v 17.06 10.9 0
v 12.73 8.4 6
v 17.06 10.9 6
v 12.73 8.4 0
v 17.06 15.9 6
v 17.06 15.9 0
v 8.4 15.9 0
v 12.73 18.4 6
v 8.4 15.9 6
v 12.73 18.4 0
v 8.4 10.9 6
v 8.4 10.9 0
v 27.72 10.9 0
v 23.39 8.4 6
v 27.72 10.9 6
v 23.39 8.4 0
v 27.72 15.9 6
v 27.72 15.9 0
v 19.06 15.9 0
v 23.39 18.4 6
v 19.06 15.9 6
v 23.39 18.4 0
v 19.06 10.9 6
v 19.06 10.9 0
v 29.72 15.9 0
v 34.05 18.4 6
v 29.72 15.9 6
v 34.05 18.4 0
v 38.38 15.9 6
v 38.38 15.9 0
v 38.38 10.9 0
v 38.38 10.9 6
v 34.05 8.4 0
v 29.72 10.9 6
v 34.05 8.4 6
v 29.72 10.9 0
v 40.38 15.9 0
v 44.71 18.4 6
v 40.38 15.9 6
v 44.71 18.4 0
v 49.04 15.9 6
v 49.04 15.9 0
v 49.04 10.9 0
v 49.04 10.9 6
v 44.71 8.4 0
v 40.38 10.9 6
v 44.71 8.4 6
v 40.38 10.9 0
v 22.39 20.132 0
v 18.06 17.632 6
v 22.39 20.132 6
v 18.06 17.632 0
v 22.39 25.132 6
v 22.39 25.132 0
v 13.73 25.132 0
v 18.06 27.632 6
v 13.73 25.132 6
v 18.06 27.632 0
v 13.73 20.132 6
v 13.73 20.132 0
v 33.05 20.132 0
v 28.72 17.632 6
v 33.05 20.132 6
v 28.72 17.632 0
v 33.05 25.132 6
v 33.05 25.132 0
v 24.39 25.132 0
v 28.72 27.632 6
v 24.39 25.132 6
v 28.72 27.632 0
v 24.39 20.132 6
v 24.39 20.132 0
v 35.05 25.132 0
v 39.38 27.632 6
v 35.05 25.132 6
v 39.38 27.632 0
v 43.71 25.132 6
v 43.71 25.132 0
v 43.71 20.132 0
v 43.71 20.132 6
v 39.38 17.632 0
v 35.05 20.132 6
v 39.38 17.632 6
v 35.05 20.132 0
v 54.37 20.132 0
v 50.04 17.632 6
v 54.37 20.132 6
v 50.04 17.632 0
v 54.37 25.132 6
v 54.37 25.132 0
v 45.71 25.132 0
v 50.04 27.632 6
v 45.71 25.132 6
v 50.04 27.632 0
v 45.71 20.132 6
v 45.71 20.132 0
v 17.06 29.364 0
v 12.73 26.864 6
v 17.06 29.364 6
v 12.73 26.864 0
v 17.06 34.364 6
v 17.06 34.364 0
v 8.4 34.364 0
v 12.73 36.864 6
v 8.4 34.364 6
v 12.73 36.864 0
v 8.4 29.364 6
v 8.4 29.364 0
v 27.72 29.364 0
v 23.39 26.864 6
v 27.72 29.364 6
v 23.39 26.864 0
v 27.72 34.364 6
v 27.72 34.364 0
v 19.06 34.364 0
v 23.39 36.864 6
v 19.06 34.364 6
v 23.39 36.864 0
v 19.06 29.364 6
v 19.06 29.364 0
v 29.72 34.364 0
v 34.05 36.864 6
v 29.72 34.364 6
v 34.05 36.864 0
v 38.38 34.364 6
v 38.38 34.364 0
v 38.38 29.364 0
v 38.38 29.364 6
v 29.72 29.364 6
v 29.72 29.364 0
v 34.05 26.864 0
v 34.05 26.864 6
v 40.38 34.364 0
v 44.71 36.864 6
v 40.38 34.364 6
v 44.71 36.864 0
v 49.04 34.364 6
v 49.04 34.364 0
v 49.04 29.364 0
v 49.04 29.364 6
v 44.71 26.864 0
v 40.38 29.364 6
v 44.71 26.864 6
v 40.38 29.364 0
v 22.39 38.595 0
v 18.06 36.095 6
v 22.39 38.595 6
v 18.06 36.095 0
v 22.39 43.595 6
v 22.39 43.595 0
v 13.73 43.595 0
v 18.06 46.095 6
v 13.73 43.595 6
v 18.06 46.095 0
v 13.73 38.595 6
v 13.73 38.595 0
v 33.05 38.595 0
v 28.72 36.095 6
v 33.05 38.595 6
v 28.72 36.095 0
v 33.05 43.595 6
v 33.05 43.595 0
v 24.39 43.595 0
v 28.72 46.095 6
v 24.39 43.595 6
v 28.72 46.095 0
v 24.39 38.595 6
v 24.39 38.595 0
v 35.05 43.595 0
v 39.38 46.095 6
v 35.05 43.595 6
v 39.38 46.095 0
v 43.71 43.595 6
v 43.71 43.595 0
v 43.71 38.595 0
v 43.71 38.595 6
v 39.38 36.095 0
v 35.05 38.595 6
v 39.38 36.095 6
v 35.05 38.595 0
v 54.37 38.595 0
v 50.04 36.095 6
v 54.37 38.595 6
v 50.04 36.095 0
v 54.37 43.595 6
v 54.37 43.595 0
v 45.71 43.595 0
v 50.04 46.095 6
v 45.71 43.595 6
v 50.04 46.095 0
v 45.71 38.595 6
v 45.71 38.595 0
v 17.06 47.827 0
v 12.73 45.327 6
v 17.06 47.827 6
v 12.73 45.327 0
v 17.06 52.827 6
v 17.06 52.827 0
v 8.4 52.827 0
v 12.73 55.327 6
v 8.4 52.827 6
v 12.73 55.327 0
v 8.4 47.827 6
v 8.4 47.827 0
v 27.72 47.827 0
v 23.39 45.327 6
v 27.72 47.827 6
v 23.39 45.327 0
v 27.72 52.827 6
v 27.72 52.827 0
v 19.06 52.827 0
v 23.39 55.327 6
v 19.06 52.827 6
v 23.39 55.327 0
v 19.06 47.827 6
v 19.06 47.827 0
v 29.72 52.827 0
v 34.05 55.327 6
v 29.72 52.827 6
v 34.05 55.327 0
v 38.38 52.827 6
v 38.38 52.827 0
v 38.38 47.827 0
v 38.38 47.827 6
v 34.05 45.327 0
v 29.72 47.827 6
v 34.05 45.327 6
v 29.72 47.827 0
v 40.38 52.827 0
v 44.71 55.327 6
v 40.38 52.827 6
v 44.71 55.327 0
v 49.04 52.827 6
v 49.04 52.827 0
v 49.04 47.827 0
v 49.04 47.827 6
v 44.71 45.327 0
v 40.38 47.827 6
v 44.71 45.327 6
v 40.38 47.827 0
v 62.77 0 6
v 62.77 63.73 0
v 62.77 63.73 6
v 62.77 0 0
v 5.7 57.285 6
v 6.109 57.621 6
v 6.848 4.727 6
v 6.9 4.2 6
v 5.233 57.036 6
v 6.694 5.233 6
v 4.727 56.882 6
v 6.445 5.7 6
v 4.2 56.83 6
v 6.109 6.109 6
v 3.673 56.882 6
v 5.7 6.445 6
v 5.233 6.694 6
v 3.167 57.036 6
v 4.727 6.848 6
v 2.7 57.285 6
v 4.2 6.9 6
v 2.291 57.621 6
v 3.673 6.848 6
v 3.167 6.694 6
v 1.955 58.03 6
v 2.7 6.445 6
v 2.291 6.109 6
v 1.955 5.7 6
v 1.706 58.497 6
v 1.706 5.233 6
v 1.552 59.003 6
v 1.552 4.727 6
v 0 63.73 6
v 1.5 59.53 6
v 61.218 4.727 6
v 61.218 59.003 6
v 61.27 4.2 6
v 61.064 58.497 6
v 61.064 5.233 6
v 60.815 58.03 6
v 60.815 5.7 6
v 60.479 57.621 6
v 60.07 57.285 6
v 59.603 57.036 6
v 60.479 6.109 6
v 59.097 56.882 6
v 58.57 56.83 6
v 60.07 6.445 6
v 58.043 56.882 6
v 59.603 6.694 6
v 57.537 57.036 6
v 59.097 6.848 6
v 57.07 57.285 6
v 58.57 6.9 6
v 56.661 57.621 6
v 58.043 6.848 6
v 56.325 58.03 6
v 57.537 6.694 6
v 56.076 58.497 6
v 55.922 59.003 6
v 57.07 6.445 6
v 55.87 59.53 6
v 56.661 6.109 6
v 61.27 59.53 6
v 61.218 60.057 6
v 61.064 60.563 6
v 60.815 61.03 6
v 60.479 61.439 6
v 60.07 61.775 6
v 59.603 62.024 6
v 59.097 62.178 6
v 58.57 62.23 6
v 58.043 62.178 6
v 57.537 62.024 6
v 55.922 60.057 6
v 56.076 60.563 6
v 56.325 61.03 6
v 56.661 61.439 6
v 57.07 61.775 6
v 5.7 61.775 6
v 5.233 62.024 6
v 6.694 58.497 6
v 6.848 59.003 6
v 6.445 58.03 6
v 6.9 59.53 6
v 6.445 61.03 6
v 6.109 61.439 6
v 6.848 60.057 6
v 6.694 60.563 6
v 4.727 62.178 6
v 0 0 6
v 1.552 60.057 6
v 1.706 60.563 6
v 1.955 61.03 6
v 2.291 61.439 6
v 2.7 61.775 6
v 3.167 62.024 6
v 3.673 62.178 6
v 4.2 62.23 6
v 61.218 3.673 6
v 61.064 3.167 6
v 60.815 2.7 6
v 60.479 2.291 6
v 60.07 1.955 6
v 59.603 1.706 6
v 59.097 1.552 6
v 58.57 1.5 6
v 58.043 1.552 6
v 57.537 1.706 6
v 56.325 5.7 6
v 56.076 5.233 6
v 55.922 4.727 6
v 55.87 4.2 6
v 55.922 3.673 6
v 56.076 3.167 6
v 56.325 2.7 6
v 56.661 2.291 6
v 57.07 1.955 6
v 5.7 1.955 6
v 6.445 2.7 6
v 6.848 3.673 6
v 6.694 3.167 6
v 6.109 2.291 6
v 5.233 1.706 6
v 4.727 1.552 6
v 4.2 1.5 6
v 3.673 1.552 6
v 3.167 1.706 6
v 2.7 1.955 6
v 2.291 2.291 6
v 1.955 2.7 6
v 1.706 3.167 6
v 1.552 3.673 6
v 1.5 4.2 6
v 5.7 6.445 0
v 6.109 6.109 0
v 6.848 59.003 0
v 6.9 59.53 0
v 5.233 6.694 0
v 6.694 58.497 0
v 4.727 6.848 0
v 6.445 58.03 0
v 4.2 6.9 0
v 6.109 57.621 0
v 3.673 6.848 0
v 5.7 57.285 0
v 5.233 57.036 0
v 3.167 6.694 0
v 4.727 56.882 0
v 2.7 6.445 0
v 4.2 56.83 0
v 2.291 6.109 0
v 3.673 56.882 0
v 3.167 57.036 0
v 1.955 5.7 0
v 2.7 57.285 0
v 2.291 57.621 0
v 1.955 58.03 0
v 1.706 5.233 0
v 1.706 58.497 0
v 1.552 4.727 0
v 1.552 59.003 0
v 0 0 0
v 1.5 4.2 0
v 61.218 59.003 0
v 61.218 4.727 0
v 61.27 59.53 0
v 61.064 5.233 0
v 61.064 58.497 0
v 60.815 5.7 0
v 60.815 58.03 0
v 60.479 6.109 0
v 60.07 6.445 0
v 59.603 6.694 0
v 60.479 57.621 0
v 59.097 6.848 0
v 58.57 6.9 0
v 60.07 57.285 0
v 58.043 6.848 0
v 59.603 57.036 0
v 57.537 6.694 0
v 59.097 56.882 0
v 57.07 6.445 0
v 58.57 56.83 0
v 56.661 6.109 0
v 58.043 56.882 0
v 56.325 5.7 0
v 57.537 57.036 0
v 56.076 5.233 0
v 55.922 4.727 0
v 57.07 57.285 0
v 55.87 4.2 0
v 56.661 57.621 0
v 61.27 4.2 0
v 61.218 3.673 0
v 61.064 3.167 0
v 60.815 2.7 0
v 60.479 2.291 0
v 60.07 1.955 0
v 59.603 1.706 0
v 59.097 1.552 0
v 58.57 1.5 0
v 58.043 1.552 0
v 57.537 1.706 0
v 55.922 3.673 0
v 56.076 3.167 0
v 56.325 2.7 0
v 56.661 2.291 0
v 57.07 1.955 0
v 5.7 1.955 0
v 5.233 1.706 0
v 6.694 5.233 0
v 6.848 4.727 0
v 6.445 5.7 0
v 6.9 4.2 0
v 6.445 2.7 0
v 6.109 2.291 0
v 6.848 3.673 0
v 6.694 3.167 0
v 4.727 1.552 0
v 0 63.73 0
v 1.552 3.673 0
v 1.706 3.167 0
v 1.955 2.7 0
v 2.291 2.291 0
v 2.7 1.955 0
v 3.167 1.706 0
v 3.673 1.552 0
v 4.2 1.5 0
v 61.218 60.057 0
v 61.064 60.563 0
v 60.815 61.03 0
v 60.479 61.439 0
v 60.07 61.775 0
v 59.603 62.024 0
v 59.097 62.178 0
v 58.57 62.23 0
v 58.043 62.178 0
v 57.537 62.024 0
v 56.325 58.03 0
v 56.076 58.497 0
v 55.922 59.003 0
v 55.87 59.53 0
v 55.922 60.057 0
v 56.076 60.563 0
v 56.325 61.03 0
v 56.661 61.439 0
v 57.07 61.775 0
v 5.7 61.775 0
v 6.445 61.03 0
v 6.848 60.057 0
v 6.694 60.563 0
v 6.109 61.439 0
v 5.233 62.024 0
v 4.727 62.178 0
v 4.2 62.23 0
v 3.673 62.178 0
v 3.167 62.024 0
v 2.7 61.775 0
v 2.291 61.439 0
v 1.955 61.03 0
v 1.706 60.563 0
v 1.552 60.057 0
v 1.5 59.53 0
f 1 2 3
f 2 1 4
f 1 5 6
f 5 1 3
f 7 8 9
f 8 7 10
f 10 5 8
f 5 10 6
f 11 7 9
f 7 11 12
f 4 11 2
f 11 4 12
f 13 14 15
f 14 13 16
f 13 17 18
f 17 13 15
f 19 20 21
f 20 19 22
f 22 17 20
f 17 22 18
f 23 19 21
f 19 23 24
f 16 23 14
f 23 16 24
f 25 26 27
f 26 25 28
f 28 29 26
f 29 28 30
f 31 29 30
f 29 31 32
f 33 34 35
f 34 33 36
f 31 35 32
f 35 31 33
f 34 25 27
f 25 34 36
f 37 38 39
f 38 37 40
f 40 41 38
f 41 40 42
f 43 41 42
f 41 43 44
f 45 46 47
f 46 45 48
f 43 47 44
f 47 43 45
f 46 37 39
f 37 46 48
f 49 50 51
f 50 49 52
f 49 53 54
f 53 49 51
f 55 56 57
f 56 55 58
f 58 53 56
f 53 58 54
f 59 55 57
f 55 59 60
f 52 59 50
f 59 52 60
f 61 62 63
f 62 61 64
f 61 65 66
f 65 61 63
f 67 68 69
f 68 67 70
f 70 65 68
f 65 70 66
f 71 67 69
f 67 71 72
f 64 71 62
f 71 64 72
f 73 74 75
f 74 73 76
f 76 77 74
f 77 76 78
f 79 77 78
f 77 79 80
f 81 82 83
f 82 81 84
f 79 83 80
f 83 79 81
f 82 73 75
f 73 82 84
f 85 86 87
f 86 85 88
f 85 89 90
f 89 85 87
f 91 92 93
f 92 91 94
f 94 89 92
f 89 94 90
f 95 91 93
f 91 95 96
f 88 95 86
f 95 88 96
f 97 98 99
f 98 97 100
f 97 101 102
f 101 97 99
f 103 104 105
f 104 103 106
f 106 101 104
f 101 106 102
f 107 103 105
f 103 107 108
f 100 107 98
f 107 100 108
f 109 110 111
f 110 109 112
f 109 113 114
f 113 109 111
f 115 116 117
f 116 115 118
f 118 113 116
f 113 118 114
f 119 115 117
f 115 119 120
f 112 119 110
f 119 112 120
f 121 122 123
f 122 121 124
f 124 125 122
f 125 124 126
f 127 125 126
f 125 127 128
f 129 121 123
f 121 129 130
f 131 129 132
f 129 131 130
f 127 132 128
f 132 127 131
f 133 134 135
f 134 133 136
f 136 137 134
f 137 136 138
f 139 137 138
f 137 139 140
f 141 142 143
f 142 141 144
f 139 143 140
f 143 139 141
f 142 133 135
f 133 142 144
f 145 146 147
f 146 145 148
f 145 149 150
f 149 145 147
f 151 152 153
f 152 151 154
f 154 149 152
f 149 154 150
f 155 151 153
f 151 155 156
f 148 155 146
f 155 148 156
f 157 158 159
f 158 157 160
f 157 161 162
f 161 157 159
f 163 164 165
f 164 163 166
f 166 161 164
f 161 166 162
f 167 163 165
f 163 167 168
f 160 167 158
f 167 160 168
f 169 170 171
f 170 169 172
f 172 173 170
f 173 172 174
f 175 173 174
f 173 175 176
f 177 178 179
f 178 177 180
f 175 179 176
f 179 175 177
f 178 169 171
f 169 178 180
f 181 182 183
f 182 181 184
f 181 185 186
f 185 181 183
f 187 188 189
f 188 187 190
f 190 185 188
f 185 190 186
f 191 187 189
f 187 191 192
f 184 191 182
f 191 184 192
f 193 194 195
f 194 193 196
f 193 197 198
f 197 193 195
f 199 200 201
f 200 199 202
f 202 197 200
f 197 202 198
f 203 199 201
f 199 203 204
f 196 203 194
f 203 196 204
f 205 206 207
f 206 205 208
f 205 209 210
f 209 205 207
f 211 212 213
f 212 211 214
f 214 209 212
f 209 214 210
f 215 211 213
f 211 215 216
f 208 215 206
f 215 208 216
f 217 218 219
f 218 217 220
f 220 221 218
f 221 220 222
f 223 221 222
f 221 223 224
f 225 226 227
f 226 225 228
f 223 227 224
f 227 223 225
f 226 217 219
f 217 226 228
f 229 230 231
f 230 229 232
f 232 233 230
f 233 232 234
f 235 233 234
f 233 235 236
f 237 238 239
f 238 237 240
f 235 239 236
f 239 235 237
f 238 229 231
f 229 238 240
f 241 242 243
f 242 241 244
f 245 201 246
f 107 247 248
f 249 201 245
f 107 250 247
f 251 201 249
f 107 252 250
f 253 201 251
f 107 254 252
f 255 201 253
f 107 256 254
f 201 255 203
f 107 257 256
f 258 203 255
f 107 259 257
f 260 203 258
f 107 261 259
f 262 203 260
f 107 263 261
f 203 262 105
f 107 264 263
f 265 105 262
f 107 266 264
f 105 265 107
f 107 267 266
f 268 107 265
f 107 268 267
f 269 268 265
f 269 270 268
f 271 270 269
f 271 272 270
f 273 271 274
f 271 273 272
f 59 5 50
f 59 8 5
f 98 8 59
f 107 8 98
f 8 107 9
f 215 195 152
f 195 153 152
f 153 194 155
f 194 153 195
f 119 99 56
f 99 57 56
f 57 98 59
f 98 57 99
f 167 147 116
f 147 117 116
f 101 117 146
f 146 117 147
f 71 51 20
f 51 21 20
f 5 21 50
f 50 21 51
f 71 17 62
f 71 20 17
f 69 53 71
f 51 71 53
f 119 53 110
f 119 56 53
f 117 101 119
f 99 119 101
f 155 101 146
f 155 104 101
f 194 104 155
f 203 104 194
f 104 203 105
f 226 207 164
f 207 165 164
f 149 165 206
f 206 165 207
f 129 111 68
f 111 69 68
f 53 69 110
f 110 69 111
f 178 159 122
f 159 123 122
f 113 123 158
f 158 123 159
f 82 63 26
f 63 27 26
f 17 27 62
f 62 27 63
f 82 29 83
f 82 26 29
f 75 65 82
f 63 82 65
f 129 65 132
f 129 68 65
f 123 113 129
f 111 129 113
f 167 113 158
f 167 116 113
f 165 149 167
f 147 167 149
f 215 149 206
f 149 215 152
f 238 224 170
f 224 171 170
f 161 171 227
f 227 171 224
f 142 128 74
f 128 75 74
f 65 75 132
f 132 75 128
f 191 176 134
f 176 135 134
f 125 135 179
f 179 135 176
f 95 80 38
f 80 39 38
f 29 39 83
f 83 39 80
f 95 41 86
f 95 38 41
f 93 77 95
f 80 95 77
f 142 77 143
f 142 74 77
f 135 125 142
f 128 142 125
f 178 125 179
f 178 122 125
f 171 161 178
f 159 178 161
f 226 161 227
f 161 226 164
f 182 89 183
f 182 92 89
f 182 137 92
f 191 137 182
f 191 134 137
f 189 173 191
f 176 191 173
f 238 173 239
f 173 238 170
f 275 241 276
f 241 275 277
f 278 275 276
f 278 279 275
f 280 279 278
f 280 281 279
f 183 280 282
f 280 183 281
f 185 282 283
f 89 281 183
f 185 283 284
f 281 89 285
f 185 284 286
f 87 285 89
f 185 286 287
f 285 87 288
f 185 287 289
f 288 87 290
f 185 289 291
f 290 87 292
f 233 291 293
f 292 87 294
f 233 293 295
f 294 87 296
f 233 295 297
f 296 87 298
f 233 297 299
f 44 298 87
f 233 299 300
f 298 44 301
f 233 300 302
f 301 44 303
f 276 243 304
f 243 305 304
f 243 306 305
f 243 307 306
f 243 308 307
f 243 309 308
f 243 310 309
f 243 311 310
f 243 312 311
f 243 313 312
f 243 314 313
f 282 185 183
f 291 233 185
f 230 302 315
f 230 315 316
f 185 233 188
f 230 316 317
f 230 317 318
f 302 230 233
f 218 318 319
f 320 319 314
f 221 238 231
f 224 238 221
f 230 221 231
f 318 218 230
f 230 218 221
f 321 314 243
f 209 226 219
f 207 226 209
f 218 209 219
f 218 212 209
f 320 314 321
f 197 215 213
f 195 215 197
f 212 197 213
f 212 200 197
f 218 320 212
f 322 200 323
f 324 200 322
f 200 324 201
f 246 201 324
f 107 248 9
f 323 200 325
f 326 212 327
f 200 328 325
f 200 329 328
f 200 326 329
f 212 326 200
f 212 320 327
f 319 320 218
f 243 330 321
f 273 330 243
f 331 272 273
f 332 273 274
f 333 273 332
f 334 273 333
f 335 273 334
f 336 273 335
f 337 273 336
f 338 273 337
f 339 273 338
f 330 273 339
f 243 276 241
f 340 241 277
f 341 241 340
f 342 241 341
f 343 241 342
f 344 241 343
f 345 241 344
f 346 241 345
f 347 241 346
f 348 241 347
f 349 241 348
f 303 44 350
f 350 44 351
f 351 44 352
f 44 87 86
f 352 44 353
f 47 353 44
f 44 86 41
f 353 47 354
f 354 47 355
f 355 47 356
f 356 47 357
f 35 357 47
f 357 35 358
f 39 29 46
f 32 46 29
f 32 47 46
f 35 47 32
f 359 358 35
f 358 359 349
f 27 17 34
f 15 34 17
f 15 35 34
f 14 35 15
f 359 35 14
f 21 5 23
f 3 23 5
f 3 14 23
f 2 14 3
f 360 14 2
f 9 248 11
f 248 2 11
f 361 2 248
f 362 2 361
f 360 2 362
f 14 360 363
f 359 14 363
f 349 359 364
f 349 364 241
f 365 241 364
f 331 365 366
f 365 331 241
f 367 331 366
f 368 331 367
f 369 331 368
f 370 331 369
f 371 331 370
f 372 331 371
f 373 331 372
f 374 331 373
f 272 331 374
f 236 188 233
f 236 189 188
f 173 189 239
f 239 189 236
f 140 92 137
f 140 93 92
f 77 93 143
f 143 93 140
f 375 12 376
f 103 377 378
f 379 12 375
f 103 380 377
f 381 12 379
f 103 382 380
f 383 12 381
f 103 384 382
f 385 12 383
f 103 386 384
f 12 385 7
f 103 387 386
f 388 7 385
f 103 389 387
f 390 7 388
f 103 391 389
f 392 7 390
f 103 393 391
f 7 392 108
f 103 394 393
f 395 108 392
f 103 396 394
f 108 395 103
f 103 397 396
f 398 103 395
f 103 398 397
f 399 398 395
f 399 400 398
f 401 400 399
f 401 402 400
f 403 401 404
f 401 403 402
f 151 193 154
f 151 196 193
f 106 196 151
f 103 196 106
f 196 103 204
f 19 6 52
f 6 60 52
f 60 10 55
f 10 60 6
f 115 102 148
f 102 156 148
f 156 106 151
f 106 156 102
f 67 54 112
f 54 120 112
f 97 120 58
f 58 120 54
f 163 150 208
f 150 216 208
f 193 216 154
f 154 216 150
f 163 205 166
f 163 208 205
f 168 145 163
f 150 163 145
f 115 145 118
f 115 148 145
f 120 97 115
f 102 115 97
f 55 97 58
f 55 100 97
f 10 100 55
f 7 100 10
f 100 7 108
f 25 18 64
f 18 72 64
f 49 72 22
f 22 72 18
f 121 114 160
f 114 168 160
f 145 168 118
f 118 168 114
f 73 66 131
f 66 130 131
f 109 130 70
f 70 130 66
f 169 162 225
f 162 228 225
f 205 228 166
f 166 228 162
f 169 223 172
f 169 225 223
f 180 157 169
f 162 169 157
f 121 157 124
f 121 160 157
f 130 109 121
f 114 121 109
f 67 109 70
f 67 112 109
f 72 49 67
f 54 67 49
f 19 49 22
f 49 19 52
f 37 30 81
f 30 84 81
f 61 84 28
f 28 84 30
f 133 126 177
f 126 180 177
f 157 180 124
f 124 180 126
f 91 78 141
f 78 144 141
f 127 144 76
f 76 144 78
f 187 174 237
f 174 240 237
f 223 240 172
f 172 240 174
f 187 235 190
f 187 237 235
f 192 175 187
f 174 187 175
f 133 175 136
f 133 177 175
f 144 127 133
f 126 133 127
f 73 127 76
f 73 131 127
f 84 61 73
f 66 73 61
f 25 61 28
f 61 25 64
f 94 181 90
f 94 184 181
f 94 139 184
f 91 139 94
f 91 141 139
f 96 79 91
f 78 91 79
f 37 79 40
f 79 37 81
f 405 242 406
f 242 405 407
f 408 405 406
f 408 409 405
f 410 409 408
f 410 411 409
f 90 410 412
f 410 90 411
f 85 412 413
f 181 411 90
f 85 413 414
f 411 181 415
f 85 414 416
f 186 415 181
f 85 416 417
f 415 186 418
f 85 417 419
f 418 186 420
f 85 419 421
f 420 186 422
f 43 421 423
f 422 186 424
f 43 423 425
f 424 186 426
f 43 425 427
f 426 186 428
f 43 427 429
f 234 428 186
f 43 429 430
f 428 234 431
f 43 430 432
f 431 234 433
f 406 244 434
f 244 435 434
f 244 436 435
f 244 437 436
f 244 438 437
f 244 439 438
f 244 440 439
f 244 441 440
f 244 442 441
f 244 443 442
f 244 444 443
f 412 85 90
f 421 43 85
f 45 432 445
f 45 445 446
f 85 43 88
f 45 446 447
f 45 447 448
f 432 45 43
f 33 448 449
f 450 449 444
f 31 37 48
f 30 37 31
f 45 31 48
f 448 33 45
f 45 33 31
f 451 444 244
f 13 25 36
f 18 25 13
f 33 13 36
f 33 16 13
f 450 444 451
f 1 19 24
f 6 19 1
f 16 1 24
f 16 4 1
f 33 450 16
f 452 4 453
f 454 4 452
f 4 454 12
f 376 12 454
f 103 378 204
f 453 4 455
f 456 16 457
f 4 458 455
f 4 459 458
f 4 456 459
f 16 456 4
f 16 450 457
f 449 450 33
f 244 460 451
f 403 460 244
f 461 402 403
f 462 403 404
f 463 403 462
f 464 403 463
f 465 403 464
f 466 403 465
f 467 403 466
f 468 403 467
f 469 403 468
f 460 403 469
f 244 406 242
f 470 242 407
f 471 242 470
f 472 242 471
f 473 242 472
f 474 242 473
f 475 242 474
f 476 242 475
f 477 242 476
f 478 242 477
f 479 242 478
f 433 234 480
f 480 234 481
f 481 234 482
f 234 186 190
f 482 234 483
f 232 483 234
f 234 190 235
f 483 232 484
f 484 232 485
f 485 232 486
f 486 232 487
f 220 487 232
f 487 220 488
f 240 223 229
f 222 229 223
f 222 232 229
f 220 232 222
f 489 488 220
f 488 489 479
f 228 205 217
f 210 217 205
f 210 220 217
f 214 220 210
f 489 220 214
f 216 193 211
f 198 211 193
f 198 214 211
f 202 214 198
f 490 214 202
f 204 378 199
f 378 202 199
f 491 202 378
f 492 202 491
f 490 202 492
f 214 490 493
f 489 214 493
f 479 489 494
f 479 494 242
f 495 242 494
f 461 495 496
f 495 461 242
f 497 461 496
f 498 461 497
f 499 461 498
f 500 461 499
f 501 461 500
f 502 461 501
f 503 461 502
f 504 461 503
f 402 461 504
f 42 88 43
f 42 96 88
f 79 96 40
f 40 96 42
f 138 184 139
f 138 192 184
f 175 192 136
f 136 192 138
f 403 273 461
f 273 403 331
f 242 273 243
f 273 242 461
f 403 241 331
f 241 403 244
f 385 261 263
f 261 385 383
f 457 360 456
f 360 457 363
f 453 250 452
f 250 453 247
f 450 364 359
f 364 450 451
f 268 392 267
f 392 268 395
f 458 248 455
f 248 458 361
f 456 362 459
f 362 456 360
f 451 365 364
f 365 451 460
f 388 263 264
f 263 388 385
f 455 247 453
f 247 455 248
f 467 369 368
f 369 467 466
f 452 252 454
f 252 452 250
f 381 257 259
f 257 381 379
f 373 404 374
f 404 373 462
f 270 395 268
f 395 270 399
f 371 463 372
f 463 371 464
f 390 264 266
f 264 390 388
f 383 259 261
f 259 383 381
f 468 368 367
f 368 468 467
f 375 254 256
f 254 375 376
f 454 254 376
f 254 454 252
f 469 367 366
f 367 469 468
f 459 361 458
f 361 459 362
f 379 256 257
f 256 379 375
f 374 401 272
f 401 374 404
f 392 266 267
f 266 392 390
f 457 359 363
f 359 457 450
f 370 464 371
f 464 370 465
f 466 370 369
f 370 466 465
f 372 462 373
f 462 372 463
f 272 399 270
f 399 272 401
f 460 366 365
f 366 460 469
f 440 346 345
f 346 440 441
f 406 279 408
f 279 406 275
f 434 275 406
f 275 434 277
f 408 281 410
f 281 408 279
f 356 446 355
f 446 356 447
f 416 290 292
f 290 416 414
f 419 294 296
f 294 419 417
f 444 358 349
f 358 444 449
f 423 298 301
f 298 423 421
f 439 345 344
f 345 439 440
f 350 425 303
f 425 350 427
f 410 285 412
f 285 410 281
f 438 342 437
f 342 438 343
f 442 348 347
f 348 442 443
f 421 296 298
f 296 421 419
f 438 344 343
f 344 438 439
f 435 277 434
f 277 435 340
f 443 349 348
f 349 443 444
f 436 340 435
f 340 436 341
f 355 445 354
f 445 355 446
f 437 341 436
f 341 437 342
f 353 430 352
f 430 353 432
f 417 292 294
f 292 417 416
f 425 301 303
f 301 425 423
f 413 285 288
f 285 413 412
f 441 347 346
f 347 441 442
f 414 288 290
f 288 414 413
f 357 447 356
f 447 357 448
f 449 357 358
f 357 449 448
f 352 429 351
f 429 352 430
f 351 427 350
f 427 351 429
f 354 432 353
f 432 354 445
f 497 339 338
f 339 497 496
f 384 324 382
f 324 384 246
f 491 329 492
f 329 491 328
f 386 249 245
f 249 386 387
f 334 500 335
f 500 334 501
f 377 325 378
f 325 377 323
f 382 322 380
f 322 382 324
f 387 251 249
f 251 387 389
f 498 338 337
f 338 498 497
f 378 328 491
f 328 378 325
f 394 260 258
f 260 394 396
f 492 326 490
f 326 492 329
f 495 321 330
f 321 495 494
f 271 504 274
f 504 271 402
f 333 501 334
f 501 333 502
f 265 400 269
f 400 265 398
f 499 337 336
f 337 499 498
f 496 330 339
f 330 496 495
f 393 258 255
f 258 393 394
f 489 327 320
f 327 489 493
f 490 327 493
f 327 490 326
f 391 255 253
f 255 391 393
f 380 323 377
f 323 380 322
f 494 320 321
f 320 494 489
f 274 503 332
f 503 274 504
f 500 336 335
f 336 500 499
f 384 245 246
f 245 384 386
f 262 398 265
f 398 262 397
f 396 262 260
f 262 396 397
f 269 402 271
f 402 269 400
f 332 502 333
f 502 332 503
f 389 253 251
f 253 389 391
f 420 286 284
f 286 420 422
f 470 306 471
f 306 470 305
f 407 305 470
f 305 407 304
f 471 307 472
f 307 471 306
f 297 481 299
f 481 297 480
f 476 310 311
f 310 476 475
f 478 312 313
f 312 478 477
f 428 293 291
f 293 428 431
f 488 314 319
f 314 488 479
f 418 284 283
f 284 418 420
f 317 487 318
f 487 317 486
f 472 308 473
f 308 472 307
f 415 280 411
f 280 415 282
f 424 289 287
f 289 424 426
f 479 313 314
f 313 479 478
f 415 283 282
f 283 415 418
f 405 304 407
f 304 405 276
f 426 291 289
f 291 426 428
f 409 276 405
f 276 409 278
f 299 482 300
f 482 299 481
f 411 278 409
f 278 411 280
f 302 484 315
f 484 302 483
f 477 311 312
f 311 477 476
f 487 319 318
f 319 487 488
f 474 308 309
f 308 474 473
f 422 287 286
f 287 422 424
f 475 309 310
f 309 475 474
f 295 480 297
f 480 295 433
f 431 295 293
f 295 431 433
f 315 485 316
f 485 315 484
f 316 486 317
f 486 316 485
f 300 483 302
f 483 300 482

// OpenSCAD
$fn = 32;

// ----------------------------------------------------------------------
// Honeycomb panel: 62.77 x 63.73 mm, 20 cells of 10 mm
// ----------------------------------------------------------------------

// --- parameters (mm) ---
panel_w = 62.77;          // panel width
panel_d = 63.73;          // panel depth
thick = 6;                // panel thickness
cell_r = 5;               // hex cell circumradius
pitch = 10.66;            // hex cell pitch (centre to centre)
web = 2;                  // web between the cells
columns = 4;              // columns of cells
rows = 5;                 // rows of cells
cell_count = 20;          // total cells
shift_x = 12.73;          // first cell offset in x
shift_y = 13.4;           // first cell offset in y
mount_d = 5.4;            // corner mounting holes
hole_off = 4.2;           // mounting hole offset from the corners

difference() {
  union() {
    cube([panel_w, panel_d, thick]);
  }
  /* hexagonal cells, point-up, cut right through the plate */
  for (row = [0 : rows - 1]) {
    for (col = [0 : columns - 1]) {
      translate([shift_x + col * pitch + (row % 2) * pitch / 2, shift_y + row * pitch * 0.866025, -2.5]) rotate([0, 0, 30]) cylinder(h = thick + 5, d = 2 * cell_r, $fn = 6);
    }
  }
  /* corner mounting holes, clear of the outer cell web */
  translate([4.2, 4.2, -2.5]) cylinder(h = thick + 5, d = mount_d);
  translate([58.57, 4.2, -2.5]) cylinder(h = thick + 5, d = mount_d);
  translate([4.2, 59.53, -2.5]) cylinder(h = thick + 5, d = mount_d);
  translate([58.57, 59.53, -2.5]) cylinder(h = thick + 5, d = mount_d);
}
